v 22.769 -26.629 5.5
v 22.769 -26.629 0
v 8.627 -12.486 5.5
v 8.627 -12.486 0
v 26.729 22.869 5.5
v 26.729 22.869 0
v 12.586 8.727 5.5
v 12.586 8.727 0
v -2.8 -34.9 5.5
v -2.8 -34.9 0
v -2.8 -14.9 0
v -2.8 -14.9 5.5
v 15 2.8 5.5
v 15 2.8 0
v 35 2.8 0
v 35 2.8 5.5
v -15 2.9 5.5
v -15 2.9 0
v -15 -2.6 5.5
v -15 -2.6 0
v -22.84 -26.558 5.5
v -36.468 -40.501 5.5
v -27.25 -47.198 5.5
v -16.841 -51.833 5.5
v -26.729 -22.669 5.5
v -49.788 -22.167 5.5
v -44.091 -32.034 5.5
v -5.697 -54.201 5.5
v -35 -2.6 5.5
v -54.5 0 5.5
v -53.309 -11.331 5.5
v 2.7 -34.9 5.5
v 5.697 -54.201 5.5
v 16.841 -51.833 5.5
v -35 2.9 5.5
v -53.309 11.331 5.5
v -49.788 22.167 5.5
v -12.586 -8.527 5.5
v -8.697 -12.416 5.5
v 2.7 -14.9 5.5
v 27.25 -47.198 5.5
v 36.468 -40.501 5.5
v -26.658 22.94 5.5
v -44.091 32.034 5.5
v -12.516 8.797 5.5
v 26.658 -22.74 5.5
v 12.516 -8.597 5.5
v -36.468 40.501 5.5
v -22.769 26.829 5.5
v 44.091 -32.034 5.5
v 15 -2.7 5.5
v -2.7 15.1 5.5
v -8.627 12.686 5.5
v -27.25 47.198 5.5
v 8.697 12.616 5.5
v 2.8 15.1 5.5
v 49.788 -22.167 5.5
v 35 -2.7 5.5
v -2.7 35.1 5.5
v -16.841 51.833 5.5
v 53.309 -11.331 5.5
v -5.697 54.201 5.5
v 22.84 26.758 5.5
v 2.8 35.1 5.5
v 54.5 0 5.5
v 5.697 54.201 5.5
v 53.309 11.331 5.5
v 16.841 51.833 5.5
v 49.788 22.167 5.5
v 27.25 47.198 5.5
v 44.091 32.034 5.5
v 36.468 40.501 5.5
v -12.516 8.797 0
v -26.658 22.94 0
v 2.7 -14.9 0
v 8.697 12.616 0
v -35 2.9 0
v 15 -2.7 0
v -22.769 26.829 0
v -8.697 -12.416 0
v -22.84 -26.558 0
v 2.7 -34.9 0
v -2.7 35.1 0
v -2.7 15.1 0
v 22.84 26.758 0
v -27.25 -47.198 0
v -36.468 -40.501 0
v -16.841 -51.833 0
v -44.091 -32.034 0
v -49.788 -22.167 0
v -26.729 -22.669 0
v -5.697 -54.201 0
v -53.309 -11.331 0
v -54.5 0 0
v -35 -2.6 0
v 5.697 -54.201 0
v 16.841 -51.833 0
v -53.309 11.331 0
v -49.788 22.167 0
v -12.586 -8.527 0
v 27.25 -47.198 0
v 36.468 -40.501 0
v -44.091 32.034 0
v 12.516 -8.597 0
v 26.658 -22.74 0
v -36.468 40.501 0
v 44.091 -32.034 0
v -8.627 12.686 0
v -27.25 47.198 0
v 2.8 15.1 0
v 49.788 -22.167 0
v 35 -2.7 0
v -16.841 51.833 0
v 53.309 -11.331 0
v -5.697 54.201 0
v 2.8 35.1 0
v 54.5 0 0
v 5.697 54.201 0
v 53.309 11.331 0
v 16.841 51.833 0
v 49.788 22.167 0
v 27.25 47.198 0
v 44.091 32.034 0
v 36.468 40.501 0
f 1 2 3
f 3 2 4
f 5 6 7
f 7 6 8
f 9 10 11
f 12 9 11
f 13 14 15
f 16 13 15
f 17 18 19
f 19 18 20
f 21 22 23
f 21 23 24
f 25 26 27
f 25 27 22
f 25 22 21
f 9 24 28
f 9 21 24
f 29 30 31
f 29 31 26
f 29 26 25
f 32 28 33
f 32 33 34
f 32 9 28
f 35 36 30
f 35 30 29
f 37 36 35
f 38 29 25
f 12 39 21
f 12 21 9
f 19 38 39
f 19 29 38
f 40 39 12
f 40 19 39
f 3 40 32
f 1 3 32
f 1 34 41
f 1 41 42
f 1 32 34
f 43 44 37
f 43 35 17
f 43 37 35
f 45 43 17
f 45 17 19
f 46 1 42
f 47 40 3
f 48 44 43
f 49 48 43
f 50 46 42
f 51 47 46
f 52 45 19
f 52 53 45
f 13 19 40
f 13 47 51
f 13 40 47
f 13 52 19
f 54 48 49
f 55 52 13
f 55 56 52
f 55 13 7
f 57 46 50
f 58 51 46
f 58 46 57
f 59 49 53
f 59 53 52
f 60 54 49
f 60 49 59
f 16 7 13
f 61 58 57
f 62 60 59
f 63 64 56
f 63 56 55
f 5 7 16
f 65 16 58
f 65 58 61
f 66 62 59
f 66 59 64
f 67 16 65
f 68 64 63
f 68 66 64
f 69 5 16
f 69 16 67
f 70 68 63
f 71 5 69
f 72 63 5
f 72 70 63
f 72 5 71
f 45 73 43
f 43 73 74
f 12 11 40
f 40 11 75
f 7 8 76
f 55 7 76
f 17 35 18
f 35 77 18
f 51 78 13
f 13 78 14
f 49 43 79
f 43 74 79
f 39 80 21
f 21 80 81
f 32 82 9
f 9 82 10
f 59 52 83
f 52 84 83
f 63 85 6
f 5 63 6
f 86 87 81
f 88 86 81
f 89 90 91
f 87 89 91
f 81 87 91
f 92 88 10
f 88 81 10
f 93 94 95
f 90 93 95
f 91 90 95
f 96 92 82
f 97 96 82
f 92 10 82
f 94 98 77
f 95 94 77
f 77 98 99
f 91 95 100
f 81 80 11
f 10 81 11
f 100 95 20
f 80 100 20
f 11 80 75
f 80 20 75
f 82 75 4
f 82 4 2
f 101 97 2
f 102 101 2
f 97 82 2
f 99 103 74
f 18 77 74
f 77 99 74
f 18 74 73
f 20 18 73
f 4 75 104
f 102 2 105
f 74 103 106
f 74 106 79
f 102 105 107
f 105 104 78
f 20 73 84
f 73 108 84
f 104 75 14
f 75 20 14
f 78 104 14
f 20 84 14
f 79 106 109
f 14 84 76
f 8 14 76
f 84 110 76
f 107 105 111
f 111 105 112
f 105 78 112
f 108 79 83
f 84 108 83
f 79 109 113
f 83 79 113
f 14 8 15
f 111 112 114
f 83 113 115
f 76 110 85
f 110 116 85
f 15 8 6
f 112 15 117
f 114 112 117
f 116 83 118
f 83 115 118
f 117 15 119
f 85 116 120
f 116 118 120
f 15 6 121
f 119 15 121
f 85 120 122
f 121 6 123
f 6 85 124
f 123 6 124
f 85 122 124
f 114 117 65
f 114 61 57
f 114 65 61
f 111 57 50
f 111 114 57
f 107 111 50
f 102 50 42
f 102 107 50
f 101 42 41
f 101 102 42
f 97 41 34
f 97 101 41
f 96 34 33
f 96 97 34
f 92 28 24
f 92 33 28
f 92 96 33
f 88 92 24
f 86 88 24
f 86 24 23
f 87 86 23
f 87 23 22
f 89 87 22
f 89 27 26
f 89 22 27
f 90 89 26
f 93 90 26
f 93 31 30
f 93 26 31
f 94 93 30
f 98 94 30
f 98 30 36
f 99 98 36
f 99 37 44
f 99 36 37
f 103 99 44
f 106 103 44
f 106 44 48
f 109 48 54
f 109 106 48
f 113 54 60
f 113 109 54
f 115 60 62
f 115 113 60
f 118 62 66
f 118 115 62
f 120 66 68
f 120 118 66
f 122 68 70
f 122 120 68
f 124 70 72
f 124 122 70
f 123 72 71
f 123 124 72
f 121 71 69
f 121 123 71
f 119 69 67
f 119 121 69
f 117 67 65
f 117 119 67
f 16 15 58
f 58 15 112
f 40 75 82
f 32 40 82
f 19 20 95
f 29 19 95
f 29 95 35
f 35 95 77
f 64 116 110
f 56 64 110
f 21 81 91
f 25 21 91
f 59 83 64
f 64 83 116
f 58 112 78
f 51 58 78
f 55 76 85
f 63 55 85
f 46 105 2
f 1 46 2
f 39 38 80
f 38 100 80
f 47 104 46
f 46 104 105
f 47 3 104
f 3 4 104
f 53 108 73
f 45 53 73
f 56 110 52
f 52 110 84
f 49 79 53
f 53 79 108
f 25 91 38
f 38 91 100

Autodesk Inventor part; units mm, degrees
ref_plane "YZ Plane" through (0, 0, 0) normal (1, 0, 0) x (0, 1, 0)
ref_plane "XZ Plane" through (0, 0, 0) normal (0, 1, 0) x (-1, 0, 0)
ref_plane "XY Plane" through (0, 0, 0) normal (0, 0, 1) x (1, 0, 0)
sketch "Sketch1" plane through (0, 0, 0) normal (0, 0, 1) x (1, 0, 0)
  circle A0 centre (0, 0) radius 54.5
  line L0 (15, 2.8) -> (35, 2.8)
  line L1 (35, 2.8) -> (35, -2.7)
  line L2 (35, -2.7) -> (15, -2.7)
  line L3 (15, -2.7) -> (15, 2.8)
  line L4 (8.6974, 12.6158) -> (22.8395, 26.7579)
  line L5 (22.8395, 26.7579) -> (26.7286, 22.8688)
  line L6 (26.7286, 22.8688) -> (12.5865, 8.7267)
  line L7 (12.5865, 8.7267) -> (8.6974, 12.6158)
  line L8 (-2.7, 15.1) -> (-2.7, 35.1)
  line L9 (-2.7, 35.1) -> (2.8, 35.1)
  line L10 (2.8, 35.1) -> (2.8, 15.1)
  line L11 (2.8, 15.1) -> (-2.7, 15.1)
  line L12 (-12.5158, 8.7974) -> (-26.6579, 22.9395)
  line L13 (-26.6579, 22.9395) -> (-22.7688, 26.8286)
  line L14 (-22.7688, 26.8286) -> (-8.6267, 12.6865)
  line L15 (-8.6267, 12.6865) -> (-12.5158, 8.7974)
  line L16 (-15, -2.6) -> (-35, -2.6)
  line L17 (-35, -2.6) -> (-35, 2.9)
  line L18 (-35, 2.9) -> (-15, 2.9)
  line L19 (-15, 2.9) -> (-15, -2.6)
  line L20 (-8.6974, -12.4158) -> (-22.8395, -26.5579)
  line L21 (-22.8395, -26.5579) -> (-26.7286, -22.6688)
  line L22 (-26.7286, -22.6688) -> (-12.5865, -8.5267)
  line L23 (-12.5865, -8.5267) -> (-8.6974, -12.4158)
  line L24 (2.7, -14.9) -> (2.7, -34.9)
  line L25 (2.7, -34.9) -> (-2.8, -34.9)
  line L26 (-2.8, -34.9) -> (-2.8, -14.9)
  line L27 (-2.8, -14.9) -> (2.7, -14.9)
  line L28 (12.5158, -8.5974) -> (26.6579, -22.7395)
  line L29 (26.6579, -22.7395) -> (22.7688, -26.6286)
  line L30 (22.7688, -26.6286) -> (8.6267, -12.4865)
  line L31 (8.6267, -12.4865) -> (12.5158, -8.5974)
  line L32 (24.2998, 0.05) -> (27.4417, 0.05)
  point P0 (0, 0.1)
  dimension "d0" = 109
  dimension "d3" = 20
  dimension "d4" = 5.5
  dimension "d5" = 360
  dimension "d8" = 2.75
extrude "Extrusion1" add sketch "Sketch1" along normal blind 5.5
properties part number "medio"
